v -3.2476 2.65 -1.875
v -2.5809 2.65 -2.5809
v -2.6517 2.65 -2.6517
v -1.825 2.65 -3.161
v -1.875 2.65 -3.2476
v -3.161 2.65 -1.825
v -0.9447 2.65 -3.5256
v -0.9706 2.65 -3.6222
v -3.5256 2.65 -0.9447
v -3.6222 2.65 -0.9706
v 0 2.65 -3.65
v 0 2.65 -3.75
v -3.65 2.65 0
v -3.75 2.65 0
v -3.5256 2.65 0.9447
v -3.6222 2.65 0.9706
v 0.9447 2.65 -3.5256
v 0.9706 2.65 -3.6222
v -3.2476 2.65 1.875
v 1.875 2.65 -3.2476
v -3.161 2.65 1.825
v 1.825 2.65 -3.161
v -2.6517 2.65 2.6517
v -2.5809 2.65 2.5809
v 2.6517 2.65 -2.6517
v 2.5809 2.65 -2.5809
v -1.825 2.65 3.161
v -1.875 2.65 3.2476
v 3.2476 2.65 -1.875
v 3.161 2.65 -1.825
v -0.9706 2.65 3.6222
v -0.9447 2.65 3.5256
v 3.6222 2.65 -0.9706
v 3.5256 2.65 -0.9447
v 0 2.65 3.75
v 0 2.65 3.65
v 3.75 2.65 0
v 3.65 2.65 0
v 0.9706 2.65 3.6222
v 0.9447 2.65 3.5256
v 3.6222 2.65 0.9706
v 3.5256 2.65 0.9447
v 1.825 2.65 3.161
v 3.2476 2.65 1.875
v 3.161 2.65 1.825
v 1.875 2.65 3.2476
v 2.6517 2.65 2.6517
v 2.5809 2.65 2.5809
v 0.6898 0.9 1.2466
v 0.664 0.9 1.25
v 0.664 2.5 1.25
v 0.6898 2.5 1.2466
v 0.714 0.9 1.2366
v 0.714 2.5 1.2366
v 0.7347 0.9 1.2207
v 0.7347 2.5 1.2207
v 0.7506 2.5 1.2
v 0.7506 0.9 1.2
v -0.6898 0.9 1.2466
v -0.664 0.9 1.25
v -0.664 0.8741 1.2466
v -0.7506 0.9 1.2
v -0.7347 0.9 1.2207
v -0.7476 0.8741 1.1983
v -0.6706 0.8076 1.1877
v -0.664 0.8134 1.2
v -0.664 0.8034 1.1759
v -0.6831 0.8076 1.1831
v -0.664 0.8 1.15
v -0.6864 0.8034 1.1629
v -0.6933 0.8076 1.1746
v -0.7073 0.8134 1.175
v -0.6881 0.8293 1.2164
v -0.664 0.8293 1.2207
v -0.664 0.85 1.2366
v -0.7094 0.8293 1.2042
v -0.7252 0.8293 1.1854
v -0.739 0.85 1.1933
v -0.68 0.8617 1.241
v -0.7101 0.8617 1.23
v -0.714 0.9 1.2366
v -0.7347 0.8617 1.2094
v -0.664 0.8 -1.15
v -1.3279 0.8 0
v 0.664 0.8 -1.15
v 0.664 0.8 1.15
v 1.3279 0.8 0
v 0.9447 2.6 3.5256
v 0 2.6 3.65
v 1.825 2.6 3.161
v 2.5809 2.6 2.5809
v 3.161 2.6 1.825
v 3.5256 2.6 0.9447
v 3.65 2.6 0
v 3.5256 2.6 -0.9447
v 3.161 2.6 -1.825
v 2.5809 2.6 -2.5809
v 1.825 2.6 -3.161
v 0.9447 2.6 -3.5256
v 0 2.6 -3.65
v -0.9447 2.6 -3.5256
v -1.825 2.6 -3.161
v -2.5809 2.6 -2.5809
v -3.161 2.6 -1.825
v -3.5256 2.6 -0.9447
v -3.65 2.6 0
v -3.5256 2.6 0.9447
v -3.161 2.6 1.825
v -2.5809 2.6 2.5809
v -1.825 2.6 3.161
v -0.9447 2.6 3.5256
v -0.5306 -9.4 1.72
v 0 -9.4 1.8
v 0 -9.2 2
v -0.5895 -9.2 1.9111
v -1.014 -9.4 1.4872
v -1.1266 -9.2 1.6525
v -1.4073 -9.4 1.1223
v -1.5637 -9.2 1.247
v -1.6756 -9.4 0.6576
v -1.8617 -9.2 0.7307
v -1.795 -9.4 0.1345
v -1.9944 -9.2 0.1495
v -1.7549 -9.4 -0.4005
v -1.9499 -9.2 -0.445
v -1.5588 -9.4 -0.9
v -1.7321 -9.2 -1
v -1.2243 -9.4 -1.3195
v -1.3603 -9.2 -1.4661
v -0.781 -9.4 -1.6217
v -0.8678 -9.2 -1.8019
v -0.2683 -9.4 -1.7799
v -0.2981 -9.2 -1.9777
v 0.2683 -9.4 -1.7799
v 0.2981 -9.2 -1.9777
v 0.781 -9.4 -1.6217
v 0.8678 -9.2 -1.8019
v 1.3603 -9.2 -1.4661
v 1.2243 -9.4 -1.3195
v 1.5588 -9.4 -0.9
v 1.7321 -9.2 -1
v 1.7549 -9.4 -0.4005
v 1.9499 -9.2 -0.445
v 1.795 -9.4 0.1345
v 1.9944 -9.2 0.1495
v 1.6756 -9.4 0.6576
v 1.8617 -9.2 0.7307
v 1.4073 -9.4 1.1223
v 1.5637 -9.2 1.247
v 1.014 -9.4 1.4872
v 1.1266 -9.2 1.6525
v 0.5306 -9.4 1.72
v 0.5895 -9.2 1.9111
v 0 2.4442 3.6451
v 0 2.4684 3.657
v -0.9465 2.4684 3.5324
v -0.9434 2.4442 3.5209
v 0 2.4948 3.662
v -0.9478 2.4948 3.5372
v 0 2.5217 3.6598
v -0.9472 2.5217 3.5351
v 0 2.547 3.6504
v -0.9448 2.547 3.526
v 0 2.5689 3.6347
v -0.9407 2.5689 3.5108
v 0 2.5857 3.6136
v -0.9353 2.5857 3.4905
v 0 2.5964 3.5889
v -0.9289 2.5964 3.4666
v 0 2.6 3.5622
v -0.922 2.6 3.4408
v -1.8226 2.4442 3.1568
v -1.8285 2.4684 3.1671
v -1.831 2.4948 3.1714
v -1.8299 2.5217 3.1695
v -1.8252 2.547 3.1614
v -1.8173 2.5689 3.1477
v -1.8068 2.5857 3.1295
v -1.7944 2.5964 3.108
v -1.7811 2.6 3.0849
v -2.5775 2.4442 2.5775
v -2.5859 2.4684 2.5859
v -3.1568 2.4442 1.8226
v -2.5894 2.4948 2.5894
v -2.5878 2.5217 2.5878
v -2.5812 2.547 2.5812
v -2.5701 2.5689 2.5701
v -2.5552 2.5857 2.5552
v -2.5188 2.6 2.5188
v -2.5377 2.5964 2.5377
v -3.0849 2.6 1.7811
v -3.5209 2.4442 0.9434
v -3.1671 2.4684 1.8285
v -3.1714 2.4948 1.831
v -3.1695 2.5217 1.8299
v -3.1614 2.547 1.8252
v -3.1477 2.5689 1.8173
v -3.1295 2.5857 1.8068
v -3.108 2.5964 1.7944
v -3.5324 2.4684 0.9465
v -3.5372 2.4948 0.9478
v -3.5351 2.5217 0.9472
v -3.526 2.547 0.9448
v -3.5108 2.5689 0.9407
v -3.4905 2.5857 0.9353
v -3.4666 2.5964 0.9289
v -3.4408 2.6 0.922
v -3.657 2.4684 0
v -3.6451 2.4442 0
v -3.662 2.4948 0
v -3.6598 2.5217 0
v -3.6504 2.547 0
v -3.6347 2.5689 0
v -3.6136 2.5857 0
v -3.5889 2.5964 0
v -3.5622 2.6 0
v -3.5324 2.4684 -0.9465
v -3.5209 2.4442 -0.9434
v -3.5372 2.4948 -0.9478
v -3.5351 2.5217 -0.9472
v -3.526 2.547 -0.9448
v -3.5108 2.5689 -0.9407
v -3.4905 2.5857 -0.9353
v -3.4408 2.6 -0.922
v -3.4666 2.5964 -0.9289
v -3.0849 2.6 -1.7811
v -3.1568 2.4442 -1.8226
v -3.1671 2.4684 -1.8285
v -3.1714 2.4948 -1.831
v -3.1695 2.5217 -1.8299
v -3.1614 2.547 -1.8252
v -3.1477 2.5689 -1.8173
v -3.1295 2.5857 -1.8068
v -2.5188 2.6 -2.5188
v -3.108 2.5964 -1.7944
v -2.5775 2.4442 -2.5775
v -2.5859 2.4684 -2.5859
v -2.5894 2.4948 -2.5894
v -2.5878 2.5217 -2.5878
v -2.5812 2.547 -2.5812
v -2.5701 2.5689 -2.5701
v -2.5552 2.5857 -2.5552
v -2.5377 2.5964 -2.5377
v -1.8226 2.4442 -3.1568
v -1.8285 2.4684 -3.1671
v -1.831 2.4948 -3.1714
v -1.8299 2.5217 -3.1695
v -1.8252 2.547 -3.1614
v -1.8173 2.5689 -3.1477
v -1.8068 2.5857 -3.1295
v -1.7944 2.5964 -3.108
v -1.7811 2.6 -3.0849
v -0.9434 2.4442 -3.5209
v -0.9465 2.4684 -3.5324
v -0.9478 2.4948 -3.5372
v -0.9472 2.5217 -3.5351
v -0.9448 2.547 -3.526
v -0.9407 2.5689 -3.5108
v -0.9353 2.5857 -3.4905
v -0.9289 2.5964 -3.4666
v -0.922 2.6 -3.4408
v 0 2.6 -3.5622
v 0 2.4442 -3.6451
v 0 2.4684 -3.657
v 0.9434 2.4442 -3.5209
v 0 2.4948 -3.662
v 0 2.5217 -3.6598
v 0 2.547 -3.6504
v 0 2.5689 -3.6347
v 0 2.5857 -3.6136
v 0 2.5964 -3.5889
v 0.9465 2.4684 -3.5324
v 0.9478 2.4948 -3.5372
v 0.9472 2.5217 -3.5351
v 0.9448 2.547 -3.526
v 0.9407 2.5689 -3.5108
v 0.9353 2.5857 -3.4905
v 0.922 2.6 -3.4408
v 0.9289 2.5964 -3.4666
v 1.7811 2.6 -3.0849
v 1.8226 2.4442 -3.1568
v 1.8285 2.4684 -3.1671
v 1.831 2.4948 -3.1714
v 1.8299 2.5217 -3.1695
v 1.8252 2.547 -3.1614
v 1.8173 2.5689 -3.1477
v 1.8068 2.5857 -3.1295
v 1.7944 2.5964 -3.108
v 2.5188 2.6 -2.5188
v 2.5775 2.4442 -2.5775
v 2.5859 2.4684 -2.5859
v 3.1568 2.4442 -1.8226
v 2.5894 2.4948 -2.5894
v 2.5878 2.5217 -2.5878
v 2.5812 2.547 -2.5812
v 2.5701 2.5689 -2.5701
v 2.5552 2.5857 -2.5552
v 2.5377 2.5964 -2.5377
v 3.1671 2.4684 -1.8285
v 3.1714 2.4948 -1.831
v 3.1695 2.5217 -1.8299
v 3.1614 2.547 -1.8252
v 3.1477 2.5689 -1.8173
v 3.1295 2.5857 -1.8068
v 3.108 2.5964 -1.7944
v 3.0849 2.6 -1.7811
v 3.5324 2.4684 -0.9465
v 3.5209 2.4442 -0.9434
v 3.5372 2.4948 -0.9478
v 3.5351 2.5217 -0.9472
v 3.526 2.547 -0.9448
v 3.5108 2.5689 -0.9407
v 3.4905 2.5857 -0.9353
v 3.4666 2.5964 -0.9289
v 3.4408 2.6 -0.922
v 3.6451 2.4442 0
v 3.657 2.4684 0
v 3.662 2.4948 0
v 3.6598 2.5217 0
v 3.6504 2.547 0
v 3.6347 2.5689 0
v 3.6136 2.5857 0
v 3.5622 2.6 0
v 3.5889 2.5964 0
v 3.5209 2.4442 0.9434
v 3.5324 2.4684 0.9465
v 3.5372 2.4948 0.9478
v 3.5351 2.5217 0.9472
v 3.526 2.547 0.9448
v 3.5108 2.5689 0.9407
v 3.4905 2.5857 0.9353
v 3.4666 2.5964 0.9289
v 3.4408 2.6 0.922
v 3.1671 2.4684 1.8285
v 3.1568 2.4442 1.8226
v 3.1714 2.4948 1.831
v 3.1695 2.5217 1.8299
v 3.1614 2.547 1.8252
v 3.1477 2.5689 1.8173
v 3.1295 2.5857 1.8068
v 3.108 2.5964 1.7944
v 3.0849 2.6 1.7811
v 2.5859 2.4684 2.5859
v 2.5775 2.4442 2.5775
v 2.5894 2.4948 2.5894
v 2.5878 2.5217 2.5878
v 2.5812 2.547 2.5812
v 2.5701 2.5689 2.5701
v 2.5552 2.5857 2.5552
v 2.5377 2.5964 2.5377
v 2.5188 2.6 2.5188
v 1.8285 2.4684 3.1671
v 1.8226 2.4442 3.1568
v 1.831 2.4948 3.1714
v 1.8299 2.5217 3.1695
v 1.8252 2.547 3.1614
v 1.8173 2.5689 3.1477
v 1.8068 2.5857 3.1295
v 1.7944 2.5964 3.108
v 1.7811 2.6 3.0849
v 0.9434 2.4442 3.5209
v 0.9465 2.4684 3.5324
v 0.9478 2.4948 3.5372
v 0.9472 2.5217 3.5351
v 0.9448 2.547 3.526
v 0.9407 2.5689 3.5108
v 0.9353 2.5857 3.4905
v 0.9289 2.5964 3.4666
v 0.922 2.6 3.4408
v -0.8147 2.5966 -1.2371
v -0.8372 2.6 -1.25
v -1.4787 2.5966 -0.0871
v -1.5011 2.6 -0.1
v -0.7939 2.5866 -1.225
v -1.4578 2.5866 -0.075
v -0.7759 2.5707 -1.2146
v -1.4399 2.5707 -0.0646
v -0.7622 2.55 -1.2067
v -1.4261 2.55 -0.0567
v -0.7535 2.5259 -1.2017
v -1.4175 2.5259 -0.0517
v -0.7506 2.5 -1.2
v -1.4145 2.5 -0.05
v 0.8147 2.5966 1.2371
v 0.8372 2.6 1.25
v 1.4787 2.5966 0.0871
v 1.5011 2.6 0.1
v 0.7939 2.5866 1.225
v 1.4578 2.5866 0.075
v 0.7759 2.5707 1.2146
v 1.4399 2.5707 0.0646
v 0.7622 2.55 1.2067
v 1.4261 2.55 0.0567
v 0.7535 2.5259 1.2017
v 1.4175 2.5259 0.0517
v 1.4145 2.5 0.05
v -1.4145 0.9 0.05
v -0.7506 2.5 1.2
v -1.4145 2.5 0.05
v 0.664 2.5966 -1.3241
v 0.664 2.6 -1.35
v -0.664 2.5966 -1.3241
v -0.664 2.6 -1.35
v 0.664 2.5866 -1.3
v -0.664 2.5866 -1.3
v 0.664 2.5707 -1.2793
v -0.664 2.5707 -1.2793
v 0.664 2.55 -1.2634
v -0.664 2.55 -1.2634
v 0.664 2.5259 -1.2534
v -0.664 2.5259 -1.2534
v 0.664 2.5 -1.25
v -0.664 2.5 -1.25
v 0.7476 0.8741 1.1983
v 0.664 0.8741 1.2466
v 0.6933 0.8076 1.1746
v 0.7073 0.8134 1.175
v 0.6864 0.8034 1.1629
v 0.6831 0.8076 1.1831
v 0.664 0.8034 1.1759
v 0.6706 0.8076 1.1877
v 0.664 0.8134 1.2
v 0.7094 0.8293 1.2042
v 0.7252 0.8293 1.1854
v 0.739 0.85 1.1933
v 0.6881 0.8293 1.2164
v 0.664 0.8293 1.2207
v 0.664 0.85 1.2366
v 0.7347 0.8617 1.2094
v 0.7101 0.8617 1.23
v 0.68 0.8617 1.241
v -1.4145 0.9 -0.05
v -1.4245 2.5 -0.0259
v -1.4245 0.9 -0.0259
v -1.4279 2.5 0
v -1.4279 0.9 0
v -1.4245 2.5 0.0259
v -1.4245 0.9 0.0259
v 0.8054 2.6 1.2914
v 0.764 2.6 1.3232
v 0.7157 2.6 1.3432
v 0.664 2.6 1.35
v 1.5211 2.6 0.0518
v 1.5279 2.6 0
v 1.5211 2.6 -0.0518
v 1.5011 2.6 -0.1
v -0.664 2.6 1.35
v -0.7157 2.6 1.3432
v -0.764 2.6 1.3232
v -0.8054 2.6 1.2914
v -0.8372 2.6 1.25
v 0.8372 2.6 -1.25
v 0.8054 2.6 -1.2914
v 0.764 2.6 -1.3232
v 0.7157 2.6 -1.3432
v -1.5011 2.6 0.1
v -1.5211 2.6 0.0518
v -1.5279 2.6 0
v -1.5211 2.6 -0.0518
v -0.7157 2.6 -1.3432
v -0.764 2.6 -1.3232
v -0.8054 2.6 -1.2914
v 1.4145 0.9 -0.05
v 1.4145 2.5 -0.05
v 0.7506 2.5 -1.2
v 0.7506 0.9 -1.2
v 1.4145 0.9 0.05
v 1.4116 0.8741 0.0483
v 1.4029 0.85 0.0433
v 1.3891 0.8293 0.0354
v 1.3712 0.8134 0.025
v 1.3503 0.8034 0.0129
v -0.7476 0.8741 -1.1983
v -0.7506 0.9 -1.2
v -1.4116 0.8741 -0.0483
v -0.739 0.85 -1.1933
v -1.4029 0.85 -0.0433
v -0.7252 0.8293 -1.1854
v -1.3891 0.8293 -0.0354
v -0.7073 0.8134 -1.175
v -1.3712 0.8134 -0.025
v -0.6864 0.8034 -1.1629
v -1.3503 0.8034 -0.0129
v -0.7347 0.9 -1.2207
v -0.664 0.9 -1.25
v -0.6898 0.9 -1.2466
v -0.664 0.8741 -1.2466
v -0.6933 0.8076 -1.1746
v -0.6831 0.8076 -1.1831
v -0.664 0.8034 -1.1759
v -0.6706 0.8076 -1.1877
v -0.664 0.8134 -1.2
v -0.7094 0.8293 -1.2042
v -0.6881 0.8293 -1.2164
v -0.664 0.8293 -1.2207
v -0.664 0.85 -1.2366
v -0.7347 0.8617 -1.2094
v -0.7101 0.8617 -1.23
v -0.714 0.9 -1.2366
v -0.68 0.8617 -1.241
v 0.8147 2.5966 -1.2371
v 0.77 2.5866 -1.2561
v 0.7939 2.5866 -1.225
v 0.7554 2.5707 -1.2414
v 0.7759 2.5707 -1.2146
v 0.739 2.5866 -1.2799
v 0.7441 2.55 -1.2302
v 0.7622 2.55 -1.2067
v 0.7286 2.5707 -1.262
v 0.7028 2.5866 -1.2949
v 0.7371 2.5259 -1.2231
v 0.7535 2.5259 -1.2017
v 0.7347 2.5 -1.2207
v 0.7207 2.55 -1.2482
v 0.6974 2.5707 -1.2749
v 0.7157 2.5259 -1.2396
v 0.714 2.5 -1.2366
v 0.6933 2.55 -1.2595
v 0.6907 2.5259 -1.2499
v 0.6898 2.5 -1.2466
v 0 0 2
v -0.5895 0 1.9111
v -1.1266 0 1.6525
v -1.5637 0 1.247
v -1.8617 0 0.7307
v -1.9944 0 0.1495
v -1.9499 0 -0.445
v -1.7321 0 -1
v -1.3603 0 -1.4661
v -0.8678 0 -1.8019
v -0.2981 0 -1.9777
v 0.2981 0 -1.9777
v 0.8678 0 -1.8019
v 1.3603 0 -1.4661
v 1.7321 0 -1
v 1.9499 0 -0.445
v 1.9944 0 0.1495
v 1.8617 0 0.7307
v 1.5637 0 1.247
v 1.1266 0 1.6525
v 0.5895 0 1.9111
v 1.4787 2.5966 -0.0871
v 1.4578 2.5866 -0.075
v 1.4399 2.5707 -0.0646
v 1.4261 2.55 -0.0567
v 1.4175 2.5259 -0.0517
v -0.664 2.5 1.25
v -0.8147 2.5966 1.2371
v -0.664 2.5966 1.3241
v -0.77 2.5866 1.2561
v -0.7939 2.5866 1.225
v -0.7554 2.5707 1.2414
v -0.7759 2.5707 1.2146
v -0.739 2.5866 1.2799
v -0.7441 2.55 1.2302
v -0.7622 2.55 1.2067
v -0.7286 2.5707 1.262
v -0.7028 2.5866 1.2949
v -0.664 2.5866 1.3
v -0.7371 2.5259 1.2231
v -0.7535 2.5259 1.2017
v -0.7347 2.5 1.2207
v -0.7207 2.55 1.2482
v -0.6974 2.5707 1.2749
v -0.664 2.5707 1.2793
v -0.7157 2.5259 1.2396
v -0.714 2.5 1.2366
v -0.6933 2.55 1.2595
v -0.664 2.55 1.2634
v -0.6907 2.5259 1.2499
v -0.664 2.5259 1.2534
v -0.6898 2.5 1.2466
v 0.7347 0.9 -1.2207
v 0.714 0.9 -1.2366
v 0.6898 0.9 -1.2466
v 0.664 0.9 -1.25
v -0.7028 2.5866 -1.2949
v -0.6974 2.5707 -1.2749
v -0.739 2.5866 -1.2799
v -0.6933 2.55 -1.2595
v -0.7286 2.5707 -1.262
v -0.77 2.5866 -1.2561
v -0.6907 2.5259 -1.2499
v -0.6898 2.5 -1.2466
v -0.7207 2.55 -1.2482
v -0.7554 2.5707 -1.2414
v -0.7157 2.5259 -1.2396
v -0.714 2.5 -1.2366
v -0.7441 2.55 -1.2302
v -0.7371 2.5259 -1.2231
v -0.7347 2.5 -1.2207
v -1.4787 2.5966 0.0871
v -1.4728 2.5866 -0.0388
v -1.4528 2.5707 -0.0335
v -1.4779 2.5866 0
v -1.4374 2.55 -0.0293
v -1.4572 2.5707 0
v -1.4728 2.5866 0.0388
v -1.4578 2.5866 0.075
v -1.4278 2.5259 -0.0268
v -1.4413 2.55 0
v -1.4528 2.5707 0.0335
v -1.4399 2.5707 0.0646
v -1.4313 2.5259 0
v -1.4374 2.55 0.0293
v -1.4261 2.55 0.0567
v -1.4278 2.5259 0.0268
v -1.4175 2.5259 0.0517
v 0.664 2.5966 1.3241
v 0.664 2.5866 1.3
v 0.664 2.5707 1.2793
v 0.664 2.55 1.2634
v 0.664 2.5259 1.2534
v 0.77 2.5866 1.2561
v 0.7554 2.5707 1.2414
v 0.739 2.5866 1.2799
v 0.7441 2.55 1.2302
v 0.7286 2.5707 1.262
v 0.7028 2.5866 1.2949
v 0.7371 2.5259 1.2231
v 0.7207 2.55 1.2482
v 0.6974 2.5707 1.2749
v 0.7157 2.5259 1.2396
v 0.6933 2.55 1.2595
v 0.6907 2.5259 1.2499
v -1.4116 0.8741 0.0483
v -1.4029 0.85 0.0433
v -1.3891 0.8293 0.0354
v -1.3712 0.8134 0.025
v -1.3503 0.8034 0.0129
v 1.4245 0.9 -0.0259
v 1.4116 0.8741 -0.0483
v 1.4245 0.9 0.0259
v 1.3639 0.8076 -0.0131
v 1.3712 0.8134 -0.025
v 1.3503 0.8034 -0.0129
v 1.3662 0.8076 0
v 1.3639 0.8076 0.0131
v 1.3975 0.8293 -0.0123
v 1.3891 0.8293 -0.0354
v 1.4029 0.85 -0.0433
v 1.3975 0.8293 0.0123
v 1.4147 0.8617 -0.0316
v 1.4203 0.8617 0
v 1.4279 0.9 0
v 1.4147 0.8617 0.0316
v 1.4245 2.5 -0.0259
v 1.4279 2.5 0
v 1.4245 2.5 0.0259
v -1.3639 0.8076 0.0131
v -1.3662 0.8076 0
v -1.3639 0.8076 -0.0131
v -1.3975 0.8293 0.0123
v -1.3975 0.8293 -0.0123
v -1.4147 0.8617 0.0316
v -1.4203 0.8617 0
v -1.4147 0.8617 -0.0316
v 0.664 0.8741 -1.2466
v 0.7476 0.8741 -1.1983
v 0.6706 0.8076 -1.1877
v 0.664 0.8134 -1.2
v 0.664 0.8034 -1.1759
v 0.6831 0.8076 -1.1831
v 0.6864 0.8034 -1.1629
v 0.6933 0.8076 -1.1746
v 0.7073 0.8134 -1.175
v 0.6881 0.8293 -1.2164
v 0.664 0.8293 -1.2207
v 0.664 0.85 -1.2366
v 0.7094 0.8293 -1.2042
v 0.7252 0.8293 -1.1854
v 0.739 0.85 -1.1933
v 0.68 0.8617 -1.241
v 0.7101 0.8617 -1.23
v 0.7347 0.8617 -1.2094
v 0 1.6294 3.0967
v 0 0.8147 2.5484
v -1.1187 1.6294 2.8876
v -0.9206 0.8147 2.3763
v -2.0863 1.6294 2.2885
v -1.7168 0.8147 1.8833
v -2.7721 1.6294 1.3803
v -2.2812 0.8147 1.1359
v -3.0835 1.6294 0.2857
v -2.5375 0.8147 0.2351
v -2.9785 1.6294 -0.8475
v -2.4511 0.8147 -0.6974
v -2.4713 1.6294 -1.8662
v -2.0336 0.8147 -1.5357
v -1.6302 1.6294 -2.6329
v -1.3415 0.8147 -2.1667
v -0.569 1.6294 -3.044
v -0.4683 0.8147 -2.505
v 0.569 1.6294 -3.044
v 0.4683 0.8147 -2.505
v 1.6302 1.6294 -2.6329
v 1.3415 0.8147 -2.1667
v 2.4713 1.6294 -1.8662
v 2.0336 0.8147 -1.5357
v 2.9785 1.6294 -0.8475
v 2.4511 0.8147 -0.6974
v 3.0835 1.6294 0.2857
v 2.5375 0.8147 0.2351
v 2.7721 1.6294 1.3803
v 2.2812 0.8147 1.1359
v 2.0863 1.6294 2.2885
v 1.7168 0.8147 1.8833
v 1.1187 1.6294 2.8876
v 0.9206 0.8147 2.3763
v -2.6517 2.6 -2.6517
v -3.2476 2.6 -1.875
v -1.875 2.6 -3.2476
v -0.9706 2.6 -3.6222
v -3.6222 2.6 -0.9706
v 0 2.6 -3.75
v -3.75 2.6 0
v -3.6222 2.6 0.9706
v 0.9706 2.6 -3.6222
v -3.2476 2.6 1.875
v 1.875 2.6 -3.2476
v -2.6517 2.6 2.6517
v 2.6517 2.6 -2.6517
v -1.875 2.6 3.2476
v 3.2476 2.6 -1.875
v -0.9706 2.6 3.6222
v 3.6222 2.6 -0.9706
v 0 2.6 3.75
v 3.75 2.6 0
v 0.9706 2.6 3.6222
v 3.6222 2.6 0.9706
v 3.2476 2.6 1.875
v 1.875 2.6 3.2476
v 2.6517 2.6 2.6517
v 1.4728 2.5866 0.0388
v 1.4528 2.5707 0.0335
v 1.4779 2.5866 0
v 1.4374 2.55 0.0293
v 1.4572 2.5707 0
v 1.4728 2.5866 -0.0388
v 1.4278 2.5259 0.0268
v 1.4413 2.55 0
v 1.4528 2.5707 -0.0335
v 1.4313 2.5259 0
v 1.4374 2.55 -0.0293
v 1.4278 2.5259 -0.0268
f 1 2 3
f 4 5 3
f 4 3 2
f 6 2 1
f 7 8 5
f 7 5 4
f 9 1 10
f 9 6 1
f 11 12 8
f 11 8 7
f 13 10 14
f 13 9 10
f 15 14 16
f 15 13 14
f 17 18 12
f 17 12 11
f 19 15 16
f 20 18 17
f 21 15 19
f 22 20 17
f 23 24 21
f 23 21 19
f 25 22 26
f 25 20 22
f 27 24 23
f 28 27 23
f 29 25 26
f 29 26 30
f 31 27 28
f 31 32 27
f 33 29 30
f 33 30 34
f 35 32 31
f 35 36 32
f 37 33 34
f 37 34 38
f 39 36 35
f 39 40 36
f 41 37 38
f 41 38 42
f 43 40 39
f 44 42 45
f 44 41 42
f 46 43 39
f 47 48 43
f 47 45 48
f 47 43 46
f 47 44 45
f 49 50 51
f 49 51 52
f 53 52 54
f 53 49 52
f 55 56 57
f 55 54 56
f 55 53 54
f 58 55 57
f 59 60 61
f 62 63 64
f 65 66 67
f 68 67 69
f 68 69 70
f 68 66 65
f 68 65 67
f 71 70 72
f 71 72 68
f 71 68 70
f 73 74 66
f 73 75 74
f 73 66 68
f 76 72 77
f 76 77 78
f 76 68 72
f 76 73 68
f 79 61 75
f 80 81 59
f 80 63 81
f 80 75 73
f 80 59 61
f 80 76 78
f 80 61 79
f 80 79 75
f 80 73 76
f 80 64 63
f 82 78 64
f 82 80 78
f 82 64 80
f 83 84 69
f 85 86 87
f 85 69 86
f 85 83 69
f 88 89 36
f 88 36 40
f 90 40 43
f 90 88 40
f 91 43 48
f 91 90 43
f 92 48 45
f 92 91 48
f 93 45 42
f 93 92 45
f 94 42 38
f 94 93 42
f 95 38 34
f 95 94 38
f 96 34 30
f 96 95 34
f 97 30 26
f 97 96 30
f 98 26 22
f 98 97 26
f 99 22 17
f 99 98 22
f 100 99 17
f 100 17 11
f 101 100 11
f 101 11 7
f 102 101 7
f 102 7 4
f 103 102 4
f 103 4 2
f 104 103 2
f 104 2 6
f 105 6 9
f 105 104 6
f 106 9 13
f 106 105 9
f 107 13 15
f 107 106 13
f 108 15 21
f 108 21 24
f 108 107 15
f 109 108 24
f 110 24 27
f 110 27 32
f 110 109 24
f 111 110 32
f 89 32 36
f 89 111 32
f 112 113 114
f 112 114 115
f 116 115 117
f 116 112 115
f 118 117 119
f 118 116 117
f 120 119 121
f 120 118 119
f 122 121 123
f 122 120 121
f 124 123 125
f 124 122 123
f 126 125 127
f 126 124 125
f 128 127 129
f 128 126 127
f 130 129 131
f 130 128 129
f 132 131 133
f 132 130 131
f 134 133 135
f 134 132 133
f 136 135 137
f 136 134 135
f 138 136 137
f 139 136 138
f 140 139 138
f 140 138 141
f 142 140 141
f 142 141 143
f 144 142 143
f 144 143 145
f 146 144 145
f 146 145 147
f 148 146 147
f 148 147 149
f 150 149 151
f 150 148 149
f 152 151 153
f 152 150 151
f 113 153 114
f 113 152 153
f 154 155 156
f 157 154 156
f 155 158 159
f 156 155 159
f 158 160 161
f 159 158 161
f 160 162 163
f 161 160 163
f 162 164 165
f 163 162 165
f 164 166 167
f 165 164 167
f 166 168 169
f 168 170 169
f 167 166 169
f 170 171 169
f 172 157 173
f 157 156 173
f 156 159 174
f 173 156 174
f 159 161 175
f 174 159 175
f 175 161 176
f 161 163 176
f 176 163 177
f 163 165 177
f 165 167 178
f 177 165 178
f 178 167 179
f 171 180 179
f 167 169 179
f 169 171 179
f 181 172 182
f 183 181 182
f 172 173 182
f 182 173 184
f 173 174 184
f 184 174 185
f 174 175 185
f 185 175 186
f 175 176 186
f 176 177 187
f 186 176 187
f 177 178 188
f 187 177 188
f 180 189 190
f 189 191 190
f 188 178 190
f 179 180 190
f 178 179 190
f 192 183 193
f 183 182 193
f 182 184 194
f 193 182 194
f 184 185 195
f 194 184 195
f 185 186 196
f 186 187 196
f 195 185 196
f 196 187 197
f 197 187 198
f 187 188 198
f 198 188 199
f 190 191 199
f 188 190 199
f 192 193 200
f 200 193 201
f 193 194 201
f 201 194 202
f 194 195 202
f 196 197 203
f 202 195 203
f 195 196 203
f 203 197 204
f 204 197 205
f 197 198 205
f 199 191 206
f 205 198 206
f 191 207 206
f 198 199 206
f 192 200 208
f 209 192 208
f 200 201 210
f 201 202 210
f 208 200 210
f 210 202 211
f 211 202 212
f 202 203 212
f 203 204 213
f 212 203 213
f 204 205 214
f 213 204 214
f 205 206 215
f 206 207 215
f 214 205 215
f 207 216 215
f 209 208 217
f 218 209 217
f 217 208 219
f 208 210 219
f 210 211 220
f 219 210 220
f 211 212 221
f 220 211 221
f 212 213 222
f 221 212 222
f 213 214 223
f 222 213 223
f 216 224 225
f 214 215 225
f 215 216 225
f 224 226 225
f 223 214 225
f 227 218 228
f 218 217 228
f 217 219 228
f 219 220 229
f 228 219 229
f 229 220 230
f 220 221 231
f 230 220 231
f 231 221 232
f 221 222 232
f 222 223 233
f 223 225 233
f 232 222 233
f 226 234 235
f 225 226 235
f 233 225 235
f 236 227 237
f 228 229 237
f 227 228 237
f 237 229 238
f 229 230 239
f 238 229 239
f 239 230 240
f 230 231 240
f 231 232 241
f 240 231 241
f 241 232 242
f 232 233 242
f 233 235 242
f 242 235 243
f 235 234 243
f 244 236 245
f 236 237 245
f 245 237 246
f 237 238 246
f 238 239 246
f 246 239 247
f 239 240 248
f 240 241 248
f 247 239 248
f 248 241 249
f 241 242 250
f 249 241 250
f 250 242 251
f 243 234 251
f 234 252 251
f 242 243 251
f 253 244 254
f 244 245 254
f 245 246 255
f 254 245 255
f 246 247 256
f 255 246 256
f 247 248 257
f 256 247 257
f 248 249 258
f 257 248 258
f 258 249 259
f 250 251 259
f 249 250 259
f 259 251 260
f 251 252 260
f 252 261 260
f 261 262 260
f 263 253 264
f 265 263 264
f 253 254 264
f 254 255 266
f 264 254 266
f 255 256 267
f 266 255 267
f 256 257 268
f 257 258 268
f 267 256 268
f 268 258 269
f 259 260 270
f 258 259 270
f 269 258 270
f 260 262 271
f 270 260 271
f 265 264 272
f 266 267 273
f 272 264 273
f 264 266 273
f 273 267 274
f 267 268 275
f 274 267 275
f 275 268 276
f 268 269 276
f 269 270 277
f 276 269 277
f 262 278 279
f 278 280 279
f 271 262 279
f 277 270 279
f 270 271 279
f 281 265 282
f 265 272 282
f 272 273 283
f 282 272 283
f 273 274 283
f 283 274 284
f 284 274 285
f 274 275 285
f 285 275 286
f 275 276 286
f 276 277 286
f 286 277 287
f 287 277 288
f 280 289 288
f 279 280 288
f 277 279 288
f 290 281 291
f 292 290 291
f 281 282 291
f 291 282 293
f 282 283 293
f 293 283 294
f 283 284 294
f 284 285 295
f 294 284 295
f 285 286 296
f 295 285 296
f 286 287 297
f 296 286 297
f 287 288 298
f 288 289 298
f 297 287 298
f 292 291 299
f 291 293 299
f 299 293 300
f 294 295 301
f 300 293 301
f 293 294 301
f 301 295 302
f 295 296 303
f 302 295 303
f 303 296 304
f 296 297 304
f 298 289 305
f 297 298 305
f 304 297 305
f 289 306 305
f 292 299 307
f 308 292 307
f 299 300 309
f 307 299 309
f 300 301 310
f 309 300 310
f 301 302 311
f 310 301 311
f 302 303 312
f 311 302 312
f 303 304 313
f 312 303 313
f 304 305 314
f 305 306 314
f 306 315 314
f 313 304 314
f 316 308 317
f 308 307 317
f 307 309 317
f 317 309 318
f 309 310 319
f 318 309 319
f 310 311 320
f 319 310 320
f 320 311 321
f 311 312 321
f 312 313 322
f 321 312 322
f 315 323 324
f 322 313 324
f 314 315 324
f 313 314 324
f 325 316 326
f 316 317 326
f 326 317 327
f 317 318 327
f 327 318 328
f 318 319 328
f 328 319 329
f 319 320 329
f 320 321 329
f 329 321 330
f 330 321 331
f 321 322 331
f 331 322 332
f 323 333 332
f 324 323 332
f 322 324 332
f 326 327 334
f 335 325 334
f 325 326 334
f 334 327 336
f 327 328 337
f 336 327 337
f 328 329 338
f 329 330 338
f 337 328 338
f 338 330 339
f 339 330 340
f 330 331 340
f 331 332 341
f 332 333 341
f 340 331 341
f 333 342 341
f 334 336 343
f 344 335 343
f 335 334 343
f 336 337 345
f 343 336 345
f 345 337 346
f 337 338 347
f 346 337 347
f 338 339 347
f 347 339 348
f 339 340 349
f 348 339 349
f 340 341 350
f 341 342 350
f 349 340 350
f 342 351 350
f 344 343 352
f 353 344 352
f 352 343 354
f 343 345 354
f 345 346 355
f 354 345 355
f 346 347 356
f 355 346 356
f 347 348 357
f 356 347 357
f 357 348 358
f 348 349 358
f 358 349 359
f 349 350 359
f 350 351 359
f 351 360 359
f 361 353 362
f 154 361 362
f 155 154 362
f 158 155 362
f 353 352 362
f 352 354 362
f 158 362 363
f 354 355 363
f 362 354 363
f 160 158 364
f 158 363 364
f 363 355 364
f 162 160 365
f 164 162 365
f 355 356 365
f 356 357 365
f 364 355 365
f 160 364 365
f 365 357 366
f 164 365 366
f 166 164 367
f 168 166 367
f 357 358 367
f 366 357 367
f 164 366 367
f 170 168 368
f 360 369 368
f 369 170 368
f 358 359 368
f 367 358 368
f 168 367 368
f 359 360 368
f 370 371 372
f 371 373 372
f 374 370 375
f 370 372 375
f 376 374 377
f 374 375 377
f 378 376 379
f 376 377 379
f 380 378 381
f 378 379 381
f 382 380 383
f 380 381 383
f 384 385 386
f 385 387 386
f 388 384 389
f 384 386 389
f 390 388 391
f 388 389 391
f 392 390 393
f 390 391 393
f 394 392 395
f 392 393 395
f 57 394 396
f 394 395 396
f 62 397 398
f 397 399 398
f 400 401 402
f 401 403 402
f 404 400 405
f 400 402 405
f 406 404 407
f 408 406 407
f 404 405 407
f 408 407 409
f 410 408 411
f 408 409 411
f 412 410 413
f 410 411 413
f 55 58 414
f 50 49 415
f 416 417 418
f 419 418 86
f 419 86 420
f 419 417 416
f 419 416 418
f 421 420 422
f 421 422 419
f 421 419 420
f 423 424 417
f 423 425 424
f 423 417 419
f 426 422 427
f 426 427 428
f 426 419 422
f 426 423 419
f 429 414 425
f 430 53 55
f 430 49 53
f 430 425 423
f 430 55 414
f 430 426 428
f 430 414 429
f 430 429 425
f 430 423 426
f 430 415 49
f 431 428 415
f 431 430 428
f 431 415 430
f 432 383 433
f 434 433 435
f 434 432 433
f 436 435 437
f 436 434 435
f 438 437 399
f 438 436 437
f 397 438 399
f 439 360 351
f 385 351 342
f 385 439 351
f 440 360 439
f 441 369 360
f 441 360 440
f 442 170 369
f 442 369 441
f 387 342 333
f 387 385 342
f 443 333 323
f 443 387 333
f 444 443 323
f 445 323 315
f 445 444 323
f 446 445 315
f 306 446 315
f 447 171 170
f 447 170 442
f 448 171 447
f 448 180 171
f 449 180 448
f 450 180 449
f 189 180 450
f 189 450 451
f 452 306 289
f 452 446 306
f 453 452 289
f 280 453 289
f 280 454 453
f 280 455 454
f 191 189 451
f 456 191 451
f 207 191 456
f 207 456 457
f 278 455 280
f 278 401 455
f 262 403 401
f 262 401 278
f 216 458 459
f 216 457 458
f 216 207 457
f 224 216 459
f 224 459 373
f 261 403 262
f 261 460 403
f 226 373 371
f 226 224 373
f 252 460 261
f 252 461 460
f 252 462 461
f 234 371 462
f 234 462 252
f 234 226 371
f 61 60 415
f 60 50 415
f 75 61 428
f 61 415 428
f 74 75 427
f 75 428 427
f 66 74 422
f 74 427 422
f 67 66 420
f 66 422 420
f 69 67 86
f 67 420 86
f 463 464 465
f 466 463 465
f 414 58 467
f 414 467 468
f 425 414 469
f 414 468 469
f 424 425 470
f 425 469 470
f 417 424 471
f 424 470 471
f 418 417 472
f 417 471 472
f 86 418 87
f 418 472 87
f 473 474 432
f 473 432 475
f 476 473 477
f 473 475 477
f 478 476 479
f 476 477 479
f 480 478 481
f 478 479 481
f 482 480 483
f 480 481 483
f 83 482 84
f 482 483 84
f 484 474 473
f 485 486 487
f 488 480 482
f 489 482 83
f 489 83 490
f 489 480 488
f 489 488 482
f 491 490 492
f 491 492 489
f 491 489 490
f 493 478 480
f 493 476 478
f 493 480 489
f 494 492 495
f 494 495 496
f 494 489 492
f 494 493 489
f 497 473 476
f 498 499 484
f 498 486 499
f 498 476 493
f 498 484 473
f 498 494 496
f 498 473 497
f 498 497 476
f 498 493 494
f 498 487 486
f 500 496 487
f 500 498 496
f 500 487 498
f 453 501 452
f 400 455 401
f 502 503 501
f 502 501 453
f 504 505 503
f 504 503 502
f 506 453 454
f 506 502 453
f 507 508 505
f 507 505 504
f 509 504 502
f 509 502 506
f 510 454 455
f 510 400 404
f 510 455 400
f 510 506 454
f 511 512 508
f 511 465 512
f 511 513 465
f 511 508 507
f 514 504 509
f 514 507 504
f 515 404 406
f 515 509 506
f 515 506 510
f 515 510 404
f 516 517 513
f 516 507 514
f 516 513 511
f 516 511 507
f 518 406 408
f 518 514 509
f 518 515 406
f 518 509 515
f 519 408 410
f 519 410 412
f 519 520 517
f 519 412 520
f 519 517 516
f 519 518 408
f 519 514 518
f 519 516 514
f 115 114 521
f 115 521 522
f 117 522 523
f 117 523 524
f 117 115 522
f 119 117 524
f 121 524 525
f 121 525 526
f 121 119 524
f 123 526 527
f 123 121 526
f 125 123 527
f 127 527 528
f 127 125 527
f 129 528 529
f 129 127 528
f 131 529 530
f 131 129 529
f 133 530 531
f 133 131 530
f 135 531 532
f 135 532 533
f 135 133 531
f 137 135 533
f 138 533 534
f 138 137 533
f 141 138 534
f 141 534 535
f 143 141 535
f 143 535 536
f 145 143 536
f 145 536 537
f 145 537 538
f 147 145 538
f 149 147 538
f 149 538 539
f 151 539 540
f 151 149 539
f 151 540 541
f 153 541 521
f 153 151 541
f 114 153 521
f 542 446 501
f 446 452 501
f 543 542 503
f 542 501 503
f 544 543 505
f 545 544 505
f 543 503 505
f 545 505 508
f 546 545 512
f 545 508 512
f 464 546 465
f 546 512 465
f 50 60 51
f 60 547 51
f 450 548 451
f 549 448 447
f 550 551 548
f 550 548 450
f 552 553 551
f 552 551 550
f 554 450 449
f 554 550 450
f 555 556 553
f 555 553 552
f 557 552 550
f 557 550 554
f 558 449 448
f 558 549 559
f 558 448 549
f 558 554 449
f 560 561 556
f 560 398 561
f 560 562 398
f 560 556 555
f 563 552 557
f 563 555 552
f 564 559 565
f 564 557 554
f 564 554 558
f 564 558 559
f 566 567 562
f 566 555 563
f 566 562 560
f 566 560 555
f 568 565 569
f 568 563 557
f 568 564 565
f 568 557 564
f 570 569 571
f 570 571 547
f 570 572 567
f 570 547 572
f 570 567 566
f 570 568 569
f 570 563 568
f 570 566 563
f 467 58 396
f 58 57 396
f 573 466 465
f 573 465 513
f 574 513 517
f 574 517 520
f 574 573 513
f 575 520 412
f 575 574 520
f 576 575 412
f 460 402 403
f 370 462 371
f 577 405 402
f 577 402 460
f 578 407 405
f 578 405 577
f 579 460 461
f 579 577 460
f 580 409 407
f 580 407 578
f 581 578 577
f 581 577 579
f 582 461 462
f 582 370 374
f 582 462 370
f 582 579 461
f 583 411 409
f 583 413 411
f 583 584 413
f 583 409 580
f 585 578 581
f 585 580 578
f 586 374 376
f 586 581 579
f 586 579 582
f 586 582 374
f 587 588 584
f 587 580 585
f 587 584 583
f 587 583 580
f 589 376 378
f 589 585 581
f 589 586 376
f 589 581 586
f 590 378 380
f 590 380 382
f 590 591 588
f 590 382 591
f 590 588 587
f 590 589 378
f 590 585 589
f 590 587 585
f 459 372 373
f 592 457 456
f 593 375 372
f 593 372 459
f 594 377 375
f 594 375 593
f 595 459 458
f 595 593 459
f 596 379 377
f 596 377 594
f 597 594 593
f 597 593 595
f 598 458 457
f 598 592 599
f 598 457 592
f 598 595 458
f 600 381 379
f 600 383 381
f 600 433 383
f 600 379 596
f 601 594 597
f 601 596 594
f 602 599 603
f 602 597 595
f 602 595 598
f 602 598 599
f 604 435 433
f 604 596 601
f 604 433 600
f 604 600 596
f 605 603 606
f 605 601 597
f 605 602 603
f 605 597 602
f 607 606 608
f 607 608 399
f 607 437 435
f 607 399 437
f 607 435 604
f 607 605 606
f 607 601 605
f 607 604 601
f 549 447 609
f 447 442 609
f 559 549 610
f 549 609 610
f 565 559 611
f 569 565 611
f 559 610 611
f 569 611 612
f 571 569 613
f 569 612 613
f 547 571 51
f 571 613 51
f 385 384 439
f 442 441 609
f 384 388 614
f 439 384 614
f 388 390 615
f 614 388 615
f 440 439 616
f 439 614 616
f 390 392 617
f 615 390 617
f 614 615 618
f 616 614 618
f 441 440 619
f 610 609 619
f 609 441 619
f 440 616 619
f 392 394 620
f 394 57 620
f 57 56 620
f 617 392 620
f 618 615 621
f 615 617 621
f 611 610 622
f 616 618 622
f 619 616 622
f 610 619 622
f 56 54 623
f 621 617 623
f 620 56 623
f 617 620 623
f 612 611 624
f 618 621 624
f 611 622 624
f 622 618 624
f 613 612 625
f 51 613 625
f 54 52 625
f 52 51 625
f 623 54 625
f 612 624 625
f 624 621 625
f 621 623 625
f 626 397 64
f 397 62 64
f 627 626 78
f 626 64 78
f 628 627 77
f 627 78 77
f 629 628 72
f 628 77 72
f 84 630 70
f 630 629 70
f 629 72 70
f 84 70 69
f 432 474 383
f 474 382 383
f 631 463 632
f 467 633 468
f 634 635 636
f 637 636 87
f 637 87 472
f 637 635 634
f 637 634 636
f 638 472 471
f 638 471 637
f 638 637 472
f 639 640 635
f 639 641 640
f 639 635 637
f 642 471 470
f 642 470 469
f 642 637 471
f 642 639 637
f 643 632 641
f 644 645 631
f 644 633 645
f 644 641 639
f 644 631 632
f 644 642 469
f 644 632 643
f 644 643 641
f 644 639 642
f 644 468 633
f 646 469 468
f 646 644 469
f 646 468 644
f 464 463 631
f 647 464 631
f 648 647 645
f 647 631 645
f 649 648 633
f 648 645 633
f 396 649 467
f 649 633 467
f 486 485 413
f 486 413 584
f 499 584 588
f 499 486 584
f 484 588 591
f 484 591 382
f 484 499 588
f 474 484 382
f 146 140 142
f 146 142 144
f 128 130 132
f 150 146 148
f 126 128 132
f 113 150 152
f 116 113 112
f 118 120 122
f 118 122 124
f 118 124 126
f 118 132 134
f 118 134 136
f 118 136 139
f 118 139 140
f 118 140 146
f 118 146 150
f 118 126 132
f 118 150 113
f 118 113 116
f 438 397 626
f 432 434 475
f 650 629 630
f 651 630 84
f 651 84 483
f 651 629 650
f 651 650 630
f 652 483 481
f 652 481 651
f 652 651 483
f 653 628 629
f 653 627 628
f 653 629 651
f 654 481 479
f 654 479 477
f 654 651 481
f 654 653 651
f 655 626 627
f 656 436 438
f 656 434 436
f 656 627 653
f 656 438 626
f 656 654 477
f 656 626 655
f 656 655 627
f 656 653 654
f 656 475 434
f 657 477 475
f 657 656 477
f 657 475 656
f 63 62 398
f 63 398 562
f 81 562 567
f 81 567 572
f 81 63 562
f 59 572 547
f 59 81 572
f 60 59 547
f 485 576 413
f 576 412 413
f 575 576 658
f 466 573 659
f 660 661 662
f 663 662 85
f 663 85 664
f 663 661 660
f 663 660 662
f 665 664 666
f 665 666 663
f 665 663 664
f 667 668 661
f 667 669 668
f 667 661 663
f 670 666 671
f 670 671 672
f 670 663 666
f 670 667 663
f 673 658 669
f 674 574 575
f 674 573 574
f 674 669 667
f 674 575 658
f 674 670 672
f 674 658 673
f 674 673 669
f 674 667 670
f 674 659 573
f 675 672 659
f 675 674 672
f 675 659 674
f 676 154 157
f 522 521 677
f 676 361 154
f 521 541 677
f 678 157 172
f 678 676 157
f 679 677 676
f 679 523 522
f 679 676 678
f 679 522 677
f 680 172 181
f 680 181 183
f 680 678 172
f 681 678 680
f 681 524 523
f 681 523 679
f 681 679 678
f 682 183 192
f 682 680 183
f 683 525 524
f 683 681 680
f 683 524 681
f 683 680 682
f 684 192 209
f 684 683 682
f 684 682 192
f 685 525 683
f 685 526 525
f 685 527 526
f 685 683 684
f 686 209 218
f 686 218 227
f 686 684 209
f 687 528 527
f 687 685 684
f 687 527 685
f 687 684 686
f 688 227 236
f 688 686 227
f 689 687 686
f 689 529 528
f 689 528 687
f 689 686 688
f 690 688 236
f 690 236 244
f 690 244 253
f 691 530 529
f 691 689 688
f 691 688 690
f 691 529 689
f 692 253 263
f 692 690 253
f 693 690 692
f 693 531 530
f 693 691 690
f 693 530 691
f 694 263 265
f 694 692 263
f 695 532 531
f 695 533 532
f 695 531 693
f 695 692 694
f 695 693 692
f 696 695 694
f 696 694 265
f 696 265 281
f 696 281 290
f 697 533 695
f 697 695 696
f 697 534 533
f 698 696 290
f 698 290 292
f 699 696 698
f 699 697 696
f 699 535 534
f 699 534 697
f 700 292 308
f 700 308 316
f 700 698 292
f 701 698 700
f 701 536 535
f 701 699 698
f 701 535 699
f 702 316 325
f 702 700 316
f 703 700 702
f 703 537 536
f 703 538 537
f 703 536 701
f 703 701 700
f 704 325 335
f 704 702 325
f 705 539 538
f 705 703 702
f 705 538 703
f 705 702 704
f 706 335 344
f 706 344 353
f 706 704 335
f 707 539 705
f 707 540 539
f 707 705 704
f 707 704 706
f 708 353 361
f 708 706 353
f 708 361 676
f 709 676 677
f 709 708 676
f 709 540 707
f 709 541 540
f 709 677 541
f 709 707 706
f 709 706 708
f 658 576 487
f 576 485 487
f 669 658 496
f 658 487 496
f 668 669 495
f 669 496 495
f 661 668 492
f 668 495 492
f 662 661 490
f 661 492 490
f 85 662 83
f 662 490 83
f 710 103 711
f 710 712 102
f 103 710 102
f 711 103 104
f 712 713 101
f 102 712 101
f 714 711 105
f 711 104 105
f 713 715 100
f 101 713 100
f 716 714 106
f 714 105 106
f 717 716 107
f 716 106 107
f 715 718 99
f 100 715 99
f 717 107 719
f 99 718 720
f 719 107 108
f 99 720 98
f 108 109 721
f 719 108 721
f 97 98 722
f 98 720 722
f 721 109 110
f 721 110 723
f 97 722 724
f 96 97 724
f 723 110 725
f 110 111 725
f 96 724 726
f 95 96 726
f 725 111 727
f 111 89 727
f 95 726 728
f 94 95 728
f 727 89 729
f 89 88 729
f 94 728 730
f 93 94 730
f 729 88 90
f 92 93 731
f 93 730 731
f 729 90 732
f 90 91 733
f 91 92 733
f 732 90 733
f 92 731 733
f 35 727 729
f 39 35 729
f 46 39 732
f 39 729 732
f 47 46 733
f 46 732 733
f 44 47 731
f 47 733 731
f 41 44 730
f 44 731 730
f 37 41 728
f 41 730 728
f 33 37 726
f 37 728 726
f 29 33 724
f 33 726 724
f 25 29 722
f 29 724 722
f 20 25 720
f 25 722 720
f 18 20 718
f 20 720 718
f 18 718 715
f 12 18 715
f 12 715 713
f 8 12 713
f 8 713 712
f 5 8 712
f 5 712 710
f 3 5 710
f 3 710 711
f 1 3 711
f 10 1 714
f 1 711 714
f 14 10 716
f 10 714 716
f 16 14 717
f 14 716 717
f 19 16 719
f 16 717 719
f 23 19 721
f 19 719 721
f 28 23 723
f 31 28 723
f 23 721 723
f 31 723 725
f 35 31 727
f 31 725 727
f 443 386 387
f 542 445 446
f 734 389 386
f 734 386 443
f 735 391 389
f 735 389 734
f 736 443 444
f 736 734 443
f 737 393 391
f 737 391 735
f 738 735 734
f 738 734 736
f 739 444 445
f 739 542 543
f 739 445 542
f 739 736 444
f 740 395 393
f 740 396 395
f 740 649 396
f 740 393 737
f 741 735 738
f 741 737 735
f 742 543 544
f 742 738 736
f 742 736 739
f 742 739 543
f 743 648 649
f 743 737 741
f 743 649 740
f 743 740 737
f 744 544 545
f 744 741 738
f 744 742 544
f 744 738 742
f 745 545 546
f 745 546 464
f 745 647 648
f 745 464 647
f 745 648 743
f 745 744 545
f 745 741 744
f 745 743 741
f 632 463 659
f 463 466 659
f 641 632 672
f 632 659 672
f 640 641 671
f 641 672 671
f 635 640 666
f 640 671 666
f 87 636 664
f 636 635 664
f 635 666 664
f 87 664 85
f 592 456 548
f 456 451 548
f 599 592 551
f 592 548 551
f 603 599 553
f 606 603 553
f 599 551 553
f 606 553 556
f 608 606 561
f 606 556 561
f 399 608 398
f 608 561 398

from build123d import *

# Parameters (mm, degrees)
CUT_EXTRUDE1_DEPTH = 1.8
CHAMFER1_SIZE      = 0.2
FILLET1_R          = 0.1
SKETCH_1_R         = 3.75
SKETCH_1_R_2       = 3.65
EXTRUDE_1920_DEPTH = 0.05


with BuildPart() as part:
    # Sketch1 → Revolve1 (revolve)
    with BuildSketch(Plane(origin=(0, 0, 0), x_dir=(0, 0, -1), z_dir=(1, 0, 0))):
        Polygon((-3.75, 2.6), (-2, 0), (-2, -9.4), (0, -9.4), (0, 2.6), align=None)
    revolve(axis=Axis((0, 2.6, 0), (0, -1, 0)))

    # Sketch2 → Cut-Extrude1 (cut)
    with BuildSketch(Plane(origin=(0, 2.6, 0), x_dir=(1, 0, 0), z_dir=(0, 1, 0))):
        Polygon((1.443375673, 0), (0.721687836, 1.25), (-0.721687836, 1.25), (-1.443375673, 0), (-0.721687836, -1.25), (0.721687836, -1.25), align=None)
    extrude(amount=-CUT_EXTRUDE1_DEPTH, mode=Mode.SUBTRACT)

    # Chamfer1
    chamfer1_edges = [part.edges().sort_by_distance(p)[0] for p in [
        (0, -9.4, -2),
    ]]
    chamfer(chamfer1_edges, length=CHAMFER1_SIZE)

    # Fillet1
    fillet1_edges = [part.edges().sort_by_distance(p)[0] for p in [
        (1.082531755, 0.8, 0.625),
        (1.443375673, 1.7, 0),
        (0, 0.8, 1.25),
        (0.721687836, 1.7, 1.25),
        (-1.082531755, 0.8, 0.625),
        (-0.721687836, 1.7, 1.25),
        (-1.082531755, 0.8, -0.625),
        (-1.443375673, 1.7, 0),
        (0, 0.8, -1.25),
        (-0.721687836, 1.7, -1.25),
        (1.082531755, 0.8, -0.625),
        (0.721687836, 1.7, -1.25),
        (1.082531755, 2.6, 0.625),
        (1.082531755, 2.6, -0.625),
        (0, 2.6, -1.25),
        (-1.082531755, 2.6, -0.625),
        (-1.082531755, 2.6, 0.625),
        (0, 2.6, 1.25),
        (0, 2.6, -3.75),
    ]]
    fillet(fillet1_edges, radius=FILLET1_R)


with BuildPart() as body_2:
    # 草图1 → Extrude 1920 (new body)
    with BuildSketch(Plane(origin=(0, 2.6, 0), x_dir=(1, 0, 0), z_dir=(0, 1, 0))):
        with Locations(Location((0, 0, 0), (0, 0, 270))):
            Circle(SKETCH_1_R)
        with Locations(Location((0, 0, 0), (0, 0, 270))):
            Circle(SKETCH_1_R_2, mode=Mode.SUBTRACT)
    extrude(amount=EXTRUDE_1920_DEPTH)


solid = Compound([part.part, body_2.part])
